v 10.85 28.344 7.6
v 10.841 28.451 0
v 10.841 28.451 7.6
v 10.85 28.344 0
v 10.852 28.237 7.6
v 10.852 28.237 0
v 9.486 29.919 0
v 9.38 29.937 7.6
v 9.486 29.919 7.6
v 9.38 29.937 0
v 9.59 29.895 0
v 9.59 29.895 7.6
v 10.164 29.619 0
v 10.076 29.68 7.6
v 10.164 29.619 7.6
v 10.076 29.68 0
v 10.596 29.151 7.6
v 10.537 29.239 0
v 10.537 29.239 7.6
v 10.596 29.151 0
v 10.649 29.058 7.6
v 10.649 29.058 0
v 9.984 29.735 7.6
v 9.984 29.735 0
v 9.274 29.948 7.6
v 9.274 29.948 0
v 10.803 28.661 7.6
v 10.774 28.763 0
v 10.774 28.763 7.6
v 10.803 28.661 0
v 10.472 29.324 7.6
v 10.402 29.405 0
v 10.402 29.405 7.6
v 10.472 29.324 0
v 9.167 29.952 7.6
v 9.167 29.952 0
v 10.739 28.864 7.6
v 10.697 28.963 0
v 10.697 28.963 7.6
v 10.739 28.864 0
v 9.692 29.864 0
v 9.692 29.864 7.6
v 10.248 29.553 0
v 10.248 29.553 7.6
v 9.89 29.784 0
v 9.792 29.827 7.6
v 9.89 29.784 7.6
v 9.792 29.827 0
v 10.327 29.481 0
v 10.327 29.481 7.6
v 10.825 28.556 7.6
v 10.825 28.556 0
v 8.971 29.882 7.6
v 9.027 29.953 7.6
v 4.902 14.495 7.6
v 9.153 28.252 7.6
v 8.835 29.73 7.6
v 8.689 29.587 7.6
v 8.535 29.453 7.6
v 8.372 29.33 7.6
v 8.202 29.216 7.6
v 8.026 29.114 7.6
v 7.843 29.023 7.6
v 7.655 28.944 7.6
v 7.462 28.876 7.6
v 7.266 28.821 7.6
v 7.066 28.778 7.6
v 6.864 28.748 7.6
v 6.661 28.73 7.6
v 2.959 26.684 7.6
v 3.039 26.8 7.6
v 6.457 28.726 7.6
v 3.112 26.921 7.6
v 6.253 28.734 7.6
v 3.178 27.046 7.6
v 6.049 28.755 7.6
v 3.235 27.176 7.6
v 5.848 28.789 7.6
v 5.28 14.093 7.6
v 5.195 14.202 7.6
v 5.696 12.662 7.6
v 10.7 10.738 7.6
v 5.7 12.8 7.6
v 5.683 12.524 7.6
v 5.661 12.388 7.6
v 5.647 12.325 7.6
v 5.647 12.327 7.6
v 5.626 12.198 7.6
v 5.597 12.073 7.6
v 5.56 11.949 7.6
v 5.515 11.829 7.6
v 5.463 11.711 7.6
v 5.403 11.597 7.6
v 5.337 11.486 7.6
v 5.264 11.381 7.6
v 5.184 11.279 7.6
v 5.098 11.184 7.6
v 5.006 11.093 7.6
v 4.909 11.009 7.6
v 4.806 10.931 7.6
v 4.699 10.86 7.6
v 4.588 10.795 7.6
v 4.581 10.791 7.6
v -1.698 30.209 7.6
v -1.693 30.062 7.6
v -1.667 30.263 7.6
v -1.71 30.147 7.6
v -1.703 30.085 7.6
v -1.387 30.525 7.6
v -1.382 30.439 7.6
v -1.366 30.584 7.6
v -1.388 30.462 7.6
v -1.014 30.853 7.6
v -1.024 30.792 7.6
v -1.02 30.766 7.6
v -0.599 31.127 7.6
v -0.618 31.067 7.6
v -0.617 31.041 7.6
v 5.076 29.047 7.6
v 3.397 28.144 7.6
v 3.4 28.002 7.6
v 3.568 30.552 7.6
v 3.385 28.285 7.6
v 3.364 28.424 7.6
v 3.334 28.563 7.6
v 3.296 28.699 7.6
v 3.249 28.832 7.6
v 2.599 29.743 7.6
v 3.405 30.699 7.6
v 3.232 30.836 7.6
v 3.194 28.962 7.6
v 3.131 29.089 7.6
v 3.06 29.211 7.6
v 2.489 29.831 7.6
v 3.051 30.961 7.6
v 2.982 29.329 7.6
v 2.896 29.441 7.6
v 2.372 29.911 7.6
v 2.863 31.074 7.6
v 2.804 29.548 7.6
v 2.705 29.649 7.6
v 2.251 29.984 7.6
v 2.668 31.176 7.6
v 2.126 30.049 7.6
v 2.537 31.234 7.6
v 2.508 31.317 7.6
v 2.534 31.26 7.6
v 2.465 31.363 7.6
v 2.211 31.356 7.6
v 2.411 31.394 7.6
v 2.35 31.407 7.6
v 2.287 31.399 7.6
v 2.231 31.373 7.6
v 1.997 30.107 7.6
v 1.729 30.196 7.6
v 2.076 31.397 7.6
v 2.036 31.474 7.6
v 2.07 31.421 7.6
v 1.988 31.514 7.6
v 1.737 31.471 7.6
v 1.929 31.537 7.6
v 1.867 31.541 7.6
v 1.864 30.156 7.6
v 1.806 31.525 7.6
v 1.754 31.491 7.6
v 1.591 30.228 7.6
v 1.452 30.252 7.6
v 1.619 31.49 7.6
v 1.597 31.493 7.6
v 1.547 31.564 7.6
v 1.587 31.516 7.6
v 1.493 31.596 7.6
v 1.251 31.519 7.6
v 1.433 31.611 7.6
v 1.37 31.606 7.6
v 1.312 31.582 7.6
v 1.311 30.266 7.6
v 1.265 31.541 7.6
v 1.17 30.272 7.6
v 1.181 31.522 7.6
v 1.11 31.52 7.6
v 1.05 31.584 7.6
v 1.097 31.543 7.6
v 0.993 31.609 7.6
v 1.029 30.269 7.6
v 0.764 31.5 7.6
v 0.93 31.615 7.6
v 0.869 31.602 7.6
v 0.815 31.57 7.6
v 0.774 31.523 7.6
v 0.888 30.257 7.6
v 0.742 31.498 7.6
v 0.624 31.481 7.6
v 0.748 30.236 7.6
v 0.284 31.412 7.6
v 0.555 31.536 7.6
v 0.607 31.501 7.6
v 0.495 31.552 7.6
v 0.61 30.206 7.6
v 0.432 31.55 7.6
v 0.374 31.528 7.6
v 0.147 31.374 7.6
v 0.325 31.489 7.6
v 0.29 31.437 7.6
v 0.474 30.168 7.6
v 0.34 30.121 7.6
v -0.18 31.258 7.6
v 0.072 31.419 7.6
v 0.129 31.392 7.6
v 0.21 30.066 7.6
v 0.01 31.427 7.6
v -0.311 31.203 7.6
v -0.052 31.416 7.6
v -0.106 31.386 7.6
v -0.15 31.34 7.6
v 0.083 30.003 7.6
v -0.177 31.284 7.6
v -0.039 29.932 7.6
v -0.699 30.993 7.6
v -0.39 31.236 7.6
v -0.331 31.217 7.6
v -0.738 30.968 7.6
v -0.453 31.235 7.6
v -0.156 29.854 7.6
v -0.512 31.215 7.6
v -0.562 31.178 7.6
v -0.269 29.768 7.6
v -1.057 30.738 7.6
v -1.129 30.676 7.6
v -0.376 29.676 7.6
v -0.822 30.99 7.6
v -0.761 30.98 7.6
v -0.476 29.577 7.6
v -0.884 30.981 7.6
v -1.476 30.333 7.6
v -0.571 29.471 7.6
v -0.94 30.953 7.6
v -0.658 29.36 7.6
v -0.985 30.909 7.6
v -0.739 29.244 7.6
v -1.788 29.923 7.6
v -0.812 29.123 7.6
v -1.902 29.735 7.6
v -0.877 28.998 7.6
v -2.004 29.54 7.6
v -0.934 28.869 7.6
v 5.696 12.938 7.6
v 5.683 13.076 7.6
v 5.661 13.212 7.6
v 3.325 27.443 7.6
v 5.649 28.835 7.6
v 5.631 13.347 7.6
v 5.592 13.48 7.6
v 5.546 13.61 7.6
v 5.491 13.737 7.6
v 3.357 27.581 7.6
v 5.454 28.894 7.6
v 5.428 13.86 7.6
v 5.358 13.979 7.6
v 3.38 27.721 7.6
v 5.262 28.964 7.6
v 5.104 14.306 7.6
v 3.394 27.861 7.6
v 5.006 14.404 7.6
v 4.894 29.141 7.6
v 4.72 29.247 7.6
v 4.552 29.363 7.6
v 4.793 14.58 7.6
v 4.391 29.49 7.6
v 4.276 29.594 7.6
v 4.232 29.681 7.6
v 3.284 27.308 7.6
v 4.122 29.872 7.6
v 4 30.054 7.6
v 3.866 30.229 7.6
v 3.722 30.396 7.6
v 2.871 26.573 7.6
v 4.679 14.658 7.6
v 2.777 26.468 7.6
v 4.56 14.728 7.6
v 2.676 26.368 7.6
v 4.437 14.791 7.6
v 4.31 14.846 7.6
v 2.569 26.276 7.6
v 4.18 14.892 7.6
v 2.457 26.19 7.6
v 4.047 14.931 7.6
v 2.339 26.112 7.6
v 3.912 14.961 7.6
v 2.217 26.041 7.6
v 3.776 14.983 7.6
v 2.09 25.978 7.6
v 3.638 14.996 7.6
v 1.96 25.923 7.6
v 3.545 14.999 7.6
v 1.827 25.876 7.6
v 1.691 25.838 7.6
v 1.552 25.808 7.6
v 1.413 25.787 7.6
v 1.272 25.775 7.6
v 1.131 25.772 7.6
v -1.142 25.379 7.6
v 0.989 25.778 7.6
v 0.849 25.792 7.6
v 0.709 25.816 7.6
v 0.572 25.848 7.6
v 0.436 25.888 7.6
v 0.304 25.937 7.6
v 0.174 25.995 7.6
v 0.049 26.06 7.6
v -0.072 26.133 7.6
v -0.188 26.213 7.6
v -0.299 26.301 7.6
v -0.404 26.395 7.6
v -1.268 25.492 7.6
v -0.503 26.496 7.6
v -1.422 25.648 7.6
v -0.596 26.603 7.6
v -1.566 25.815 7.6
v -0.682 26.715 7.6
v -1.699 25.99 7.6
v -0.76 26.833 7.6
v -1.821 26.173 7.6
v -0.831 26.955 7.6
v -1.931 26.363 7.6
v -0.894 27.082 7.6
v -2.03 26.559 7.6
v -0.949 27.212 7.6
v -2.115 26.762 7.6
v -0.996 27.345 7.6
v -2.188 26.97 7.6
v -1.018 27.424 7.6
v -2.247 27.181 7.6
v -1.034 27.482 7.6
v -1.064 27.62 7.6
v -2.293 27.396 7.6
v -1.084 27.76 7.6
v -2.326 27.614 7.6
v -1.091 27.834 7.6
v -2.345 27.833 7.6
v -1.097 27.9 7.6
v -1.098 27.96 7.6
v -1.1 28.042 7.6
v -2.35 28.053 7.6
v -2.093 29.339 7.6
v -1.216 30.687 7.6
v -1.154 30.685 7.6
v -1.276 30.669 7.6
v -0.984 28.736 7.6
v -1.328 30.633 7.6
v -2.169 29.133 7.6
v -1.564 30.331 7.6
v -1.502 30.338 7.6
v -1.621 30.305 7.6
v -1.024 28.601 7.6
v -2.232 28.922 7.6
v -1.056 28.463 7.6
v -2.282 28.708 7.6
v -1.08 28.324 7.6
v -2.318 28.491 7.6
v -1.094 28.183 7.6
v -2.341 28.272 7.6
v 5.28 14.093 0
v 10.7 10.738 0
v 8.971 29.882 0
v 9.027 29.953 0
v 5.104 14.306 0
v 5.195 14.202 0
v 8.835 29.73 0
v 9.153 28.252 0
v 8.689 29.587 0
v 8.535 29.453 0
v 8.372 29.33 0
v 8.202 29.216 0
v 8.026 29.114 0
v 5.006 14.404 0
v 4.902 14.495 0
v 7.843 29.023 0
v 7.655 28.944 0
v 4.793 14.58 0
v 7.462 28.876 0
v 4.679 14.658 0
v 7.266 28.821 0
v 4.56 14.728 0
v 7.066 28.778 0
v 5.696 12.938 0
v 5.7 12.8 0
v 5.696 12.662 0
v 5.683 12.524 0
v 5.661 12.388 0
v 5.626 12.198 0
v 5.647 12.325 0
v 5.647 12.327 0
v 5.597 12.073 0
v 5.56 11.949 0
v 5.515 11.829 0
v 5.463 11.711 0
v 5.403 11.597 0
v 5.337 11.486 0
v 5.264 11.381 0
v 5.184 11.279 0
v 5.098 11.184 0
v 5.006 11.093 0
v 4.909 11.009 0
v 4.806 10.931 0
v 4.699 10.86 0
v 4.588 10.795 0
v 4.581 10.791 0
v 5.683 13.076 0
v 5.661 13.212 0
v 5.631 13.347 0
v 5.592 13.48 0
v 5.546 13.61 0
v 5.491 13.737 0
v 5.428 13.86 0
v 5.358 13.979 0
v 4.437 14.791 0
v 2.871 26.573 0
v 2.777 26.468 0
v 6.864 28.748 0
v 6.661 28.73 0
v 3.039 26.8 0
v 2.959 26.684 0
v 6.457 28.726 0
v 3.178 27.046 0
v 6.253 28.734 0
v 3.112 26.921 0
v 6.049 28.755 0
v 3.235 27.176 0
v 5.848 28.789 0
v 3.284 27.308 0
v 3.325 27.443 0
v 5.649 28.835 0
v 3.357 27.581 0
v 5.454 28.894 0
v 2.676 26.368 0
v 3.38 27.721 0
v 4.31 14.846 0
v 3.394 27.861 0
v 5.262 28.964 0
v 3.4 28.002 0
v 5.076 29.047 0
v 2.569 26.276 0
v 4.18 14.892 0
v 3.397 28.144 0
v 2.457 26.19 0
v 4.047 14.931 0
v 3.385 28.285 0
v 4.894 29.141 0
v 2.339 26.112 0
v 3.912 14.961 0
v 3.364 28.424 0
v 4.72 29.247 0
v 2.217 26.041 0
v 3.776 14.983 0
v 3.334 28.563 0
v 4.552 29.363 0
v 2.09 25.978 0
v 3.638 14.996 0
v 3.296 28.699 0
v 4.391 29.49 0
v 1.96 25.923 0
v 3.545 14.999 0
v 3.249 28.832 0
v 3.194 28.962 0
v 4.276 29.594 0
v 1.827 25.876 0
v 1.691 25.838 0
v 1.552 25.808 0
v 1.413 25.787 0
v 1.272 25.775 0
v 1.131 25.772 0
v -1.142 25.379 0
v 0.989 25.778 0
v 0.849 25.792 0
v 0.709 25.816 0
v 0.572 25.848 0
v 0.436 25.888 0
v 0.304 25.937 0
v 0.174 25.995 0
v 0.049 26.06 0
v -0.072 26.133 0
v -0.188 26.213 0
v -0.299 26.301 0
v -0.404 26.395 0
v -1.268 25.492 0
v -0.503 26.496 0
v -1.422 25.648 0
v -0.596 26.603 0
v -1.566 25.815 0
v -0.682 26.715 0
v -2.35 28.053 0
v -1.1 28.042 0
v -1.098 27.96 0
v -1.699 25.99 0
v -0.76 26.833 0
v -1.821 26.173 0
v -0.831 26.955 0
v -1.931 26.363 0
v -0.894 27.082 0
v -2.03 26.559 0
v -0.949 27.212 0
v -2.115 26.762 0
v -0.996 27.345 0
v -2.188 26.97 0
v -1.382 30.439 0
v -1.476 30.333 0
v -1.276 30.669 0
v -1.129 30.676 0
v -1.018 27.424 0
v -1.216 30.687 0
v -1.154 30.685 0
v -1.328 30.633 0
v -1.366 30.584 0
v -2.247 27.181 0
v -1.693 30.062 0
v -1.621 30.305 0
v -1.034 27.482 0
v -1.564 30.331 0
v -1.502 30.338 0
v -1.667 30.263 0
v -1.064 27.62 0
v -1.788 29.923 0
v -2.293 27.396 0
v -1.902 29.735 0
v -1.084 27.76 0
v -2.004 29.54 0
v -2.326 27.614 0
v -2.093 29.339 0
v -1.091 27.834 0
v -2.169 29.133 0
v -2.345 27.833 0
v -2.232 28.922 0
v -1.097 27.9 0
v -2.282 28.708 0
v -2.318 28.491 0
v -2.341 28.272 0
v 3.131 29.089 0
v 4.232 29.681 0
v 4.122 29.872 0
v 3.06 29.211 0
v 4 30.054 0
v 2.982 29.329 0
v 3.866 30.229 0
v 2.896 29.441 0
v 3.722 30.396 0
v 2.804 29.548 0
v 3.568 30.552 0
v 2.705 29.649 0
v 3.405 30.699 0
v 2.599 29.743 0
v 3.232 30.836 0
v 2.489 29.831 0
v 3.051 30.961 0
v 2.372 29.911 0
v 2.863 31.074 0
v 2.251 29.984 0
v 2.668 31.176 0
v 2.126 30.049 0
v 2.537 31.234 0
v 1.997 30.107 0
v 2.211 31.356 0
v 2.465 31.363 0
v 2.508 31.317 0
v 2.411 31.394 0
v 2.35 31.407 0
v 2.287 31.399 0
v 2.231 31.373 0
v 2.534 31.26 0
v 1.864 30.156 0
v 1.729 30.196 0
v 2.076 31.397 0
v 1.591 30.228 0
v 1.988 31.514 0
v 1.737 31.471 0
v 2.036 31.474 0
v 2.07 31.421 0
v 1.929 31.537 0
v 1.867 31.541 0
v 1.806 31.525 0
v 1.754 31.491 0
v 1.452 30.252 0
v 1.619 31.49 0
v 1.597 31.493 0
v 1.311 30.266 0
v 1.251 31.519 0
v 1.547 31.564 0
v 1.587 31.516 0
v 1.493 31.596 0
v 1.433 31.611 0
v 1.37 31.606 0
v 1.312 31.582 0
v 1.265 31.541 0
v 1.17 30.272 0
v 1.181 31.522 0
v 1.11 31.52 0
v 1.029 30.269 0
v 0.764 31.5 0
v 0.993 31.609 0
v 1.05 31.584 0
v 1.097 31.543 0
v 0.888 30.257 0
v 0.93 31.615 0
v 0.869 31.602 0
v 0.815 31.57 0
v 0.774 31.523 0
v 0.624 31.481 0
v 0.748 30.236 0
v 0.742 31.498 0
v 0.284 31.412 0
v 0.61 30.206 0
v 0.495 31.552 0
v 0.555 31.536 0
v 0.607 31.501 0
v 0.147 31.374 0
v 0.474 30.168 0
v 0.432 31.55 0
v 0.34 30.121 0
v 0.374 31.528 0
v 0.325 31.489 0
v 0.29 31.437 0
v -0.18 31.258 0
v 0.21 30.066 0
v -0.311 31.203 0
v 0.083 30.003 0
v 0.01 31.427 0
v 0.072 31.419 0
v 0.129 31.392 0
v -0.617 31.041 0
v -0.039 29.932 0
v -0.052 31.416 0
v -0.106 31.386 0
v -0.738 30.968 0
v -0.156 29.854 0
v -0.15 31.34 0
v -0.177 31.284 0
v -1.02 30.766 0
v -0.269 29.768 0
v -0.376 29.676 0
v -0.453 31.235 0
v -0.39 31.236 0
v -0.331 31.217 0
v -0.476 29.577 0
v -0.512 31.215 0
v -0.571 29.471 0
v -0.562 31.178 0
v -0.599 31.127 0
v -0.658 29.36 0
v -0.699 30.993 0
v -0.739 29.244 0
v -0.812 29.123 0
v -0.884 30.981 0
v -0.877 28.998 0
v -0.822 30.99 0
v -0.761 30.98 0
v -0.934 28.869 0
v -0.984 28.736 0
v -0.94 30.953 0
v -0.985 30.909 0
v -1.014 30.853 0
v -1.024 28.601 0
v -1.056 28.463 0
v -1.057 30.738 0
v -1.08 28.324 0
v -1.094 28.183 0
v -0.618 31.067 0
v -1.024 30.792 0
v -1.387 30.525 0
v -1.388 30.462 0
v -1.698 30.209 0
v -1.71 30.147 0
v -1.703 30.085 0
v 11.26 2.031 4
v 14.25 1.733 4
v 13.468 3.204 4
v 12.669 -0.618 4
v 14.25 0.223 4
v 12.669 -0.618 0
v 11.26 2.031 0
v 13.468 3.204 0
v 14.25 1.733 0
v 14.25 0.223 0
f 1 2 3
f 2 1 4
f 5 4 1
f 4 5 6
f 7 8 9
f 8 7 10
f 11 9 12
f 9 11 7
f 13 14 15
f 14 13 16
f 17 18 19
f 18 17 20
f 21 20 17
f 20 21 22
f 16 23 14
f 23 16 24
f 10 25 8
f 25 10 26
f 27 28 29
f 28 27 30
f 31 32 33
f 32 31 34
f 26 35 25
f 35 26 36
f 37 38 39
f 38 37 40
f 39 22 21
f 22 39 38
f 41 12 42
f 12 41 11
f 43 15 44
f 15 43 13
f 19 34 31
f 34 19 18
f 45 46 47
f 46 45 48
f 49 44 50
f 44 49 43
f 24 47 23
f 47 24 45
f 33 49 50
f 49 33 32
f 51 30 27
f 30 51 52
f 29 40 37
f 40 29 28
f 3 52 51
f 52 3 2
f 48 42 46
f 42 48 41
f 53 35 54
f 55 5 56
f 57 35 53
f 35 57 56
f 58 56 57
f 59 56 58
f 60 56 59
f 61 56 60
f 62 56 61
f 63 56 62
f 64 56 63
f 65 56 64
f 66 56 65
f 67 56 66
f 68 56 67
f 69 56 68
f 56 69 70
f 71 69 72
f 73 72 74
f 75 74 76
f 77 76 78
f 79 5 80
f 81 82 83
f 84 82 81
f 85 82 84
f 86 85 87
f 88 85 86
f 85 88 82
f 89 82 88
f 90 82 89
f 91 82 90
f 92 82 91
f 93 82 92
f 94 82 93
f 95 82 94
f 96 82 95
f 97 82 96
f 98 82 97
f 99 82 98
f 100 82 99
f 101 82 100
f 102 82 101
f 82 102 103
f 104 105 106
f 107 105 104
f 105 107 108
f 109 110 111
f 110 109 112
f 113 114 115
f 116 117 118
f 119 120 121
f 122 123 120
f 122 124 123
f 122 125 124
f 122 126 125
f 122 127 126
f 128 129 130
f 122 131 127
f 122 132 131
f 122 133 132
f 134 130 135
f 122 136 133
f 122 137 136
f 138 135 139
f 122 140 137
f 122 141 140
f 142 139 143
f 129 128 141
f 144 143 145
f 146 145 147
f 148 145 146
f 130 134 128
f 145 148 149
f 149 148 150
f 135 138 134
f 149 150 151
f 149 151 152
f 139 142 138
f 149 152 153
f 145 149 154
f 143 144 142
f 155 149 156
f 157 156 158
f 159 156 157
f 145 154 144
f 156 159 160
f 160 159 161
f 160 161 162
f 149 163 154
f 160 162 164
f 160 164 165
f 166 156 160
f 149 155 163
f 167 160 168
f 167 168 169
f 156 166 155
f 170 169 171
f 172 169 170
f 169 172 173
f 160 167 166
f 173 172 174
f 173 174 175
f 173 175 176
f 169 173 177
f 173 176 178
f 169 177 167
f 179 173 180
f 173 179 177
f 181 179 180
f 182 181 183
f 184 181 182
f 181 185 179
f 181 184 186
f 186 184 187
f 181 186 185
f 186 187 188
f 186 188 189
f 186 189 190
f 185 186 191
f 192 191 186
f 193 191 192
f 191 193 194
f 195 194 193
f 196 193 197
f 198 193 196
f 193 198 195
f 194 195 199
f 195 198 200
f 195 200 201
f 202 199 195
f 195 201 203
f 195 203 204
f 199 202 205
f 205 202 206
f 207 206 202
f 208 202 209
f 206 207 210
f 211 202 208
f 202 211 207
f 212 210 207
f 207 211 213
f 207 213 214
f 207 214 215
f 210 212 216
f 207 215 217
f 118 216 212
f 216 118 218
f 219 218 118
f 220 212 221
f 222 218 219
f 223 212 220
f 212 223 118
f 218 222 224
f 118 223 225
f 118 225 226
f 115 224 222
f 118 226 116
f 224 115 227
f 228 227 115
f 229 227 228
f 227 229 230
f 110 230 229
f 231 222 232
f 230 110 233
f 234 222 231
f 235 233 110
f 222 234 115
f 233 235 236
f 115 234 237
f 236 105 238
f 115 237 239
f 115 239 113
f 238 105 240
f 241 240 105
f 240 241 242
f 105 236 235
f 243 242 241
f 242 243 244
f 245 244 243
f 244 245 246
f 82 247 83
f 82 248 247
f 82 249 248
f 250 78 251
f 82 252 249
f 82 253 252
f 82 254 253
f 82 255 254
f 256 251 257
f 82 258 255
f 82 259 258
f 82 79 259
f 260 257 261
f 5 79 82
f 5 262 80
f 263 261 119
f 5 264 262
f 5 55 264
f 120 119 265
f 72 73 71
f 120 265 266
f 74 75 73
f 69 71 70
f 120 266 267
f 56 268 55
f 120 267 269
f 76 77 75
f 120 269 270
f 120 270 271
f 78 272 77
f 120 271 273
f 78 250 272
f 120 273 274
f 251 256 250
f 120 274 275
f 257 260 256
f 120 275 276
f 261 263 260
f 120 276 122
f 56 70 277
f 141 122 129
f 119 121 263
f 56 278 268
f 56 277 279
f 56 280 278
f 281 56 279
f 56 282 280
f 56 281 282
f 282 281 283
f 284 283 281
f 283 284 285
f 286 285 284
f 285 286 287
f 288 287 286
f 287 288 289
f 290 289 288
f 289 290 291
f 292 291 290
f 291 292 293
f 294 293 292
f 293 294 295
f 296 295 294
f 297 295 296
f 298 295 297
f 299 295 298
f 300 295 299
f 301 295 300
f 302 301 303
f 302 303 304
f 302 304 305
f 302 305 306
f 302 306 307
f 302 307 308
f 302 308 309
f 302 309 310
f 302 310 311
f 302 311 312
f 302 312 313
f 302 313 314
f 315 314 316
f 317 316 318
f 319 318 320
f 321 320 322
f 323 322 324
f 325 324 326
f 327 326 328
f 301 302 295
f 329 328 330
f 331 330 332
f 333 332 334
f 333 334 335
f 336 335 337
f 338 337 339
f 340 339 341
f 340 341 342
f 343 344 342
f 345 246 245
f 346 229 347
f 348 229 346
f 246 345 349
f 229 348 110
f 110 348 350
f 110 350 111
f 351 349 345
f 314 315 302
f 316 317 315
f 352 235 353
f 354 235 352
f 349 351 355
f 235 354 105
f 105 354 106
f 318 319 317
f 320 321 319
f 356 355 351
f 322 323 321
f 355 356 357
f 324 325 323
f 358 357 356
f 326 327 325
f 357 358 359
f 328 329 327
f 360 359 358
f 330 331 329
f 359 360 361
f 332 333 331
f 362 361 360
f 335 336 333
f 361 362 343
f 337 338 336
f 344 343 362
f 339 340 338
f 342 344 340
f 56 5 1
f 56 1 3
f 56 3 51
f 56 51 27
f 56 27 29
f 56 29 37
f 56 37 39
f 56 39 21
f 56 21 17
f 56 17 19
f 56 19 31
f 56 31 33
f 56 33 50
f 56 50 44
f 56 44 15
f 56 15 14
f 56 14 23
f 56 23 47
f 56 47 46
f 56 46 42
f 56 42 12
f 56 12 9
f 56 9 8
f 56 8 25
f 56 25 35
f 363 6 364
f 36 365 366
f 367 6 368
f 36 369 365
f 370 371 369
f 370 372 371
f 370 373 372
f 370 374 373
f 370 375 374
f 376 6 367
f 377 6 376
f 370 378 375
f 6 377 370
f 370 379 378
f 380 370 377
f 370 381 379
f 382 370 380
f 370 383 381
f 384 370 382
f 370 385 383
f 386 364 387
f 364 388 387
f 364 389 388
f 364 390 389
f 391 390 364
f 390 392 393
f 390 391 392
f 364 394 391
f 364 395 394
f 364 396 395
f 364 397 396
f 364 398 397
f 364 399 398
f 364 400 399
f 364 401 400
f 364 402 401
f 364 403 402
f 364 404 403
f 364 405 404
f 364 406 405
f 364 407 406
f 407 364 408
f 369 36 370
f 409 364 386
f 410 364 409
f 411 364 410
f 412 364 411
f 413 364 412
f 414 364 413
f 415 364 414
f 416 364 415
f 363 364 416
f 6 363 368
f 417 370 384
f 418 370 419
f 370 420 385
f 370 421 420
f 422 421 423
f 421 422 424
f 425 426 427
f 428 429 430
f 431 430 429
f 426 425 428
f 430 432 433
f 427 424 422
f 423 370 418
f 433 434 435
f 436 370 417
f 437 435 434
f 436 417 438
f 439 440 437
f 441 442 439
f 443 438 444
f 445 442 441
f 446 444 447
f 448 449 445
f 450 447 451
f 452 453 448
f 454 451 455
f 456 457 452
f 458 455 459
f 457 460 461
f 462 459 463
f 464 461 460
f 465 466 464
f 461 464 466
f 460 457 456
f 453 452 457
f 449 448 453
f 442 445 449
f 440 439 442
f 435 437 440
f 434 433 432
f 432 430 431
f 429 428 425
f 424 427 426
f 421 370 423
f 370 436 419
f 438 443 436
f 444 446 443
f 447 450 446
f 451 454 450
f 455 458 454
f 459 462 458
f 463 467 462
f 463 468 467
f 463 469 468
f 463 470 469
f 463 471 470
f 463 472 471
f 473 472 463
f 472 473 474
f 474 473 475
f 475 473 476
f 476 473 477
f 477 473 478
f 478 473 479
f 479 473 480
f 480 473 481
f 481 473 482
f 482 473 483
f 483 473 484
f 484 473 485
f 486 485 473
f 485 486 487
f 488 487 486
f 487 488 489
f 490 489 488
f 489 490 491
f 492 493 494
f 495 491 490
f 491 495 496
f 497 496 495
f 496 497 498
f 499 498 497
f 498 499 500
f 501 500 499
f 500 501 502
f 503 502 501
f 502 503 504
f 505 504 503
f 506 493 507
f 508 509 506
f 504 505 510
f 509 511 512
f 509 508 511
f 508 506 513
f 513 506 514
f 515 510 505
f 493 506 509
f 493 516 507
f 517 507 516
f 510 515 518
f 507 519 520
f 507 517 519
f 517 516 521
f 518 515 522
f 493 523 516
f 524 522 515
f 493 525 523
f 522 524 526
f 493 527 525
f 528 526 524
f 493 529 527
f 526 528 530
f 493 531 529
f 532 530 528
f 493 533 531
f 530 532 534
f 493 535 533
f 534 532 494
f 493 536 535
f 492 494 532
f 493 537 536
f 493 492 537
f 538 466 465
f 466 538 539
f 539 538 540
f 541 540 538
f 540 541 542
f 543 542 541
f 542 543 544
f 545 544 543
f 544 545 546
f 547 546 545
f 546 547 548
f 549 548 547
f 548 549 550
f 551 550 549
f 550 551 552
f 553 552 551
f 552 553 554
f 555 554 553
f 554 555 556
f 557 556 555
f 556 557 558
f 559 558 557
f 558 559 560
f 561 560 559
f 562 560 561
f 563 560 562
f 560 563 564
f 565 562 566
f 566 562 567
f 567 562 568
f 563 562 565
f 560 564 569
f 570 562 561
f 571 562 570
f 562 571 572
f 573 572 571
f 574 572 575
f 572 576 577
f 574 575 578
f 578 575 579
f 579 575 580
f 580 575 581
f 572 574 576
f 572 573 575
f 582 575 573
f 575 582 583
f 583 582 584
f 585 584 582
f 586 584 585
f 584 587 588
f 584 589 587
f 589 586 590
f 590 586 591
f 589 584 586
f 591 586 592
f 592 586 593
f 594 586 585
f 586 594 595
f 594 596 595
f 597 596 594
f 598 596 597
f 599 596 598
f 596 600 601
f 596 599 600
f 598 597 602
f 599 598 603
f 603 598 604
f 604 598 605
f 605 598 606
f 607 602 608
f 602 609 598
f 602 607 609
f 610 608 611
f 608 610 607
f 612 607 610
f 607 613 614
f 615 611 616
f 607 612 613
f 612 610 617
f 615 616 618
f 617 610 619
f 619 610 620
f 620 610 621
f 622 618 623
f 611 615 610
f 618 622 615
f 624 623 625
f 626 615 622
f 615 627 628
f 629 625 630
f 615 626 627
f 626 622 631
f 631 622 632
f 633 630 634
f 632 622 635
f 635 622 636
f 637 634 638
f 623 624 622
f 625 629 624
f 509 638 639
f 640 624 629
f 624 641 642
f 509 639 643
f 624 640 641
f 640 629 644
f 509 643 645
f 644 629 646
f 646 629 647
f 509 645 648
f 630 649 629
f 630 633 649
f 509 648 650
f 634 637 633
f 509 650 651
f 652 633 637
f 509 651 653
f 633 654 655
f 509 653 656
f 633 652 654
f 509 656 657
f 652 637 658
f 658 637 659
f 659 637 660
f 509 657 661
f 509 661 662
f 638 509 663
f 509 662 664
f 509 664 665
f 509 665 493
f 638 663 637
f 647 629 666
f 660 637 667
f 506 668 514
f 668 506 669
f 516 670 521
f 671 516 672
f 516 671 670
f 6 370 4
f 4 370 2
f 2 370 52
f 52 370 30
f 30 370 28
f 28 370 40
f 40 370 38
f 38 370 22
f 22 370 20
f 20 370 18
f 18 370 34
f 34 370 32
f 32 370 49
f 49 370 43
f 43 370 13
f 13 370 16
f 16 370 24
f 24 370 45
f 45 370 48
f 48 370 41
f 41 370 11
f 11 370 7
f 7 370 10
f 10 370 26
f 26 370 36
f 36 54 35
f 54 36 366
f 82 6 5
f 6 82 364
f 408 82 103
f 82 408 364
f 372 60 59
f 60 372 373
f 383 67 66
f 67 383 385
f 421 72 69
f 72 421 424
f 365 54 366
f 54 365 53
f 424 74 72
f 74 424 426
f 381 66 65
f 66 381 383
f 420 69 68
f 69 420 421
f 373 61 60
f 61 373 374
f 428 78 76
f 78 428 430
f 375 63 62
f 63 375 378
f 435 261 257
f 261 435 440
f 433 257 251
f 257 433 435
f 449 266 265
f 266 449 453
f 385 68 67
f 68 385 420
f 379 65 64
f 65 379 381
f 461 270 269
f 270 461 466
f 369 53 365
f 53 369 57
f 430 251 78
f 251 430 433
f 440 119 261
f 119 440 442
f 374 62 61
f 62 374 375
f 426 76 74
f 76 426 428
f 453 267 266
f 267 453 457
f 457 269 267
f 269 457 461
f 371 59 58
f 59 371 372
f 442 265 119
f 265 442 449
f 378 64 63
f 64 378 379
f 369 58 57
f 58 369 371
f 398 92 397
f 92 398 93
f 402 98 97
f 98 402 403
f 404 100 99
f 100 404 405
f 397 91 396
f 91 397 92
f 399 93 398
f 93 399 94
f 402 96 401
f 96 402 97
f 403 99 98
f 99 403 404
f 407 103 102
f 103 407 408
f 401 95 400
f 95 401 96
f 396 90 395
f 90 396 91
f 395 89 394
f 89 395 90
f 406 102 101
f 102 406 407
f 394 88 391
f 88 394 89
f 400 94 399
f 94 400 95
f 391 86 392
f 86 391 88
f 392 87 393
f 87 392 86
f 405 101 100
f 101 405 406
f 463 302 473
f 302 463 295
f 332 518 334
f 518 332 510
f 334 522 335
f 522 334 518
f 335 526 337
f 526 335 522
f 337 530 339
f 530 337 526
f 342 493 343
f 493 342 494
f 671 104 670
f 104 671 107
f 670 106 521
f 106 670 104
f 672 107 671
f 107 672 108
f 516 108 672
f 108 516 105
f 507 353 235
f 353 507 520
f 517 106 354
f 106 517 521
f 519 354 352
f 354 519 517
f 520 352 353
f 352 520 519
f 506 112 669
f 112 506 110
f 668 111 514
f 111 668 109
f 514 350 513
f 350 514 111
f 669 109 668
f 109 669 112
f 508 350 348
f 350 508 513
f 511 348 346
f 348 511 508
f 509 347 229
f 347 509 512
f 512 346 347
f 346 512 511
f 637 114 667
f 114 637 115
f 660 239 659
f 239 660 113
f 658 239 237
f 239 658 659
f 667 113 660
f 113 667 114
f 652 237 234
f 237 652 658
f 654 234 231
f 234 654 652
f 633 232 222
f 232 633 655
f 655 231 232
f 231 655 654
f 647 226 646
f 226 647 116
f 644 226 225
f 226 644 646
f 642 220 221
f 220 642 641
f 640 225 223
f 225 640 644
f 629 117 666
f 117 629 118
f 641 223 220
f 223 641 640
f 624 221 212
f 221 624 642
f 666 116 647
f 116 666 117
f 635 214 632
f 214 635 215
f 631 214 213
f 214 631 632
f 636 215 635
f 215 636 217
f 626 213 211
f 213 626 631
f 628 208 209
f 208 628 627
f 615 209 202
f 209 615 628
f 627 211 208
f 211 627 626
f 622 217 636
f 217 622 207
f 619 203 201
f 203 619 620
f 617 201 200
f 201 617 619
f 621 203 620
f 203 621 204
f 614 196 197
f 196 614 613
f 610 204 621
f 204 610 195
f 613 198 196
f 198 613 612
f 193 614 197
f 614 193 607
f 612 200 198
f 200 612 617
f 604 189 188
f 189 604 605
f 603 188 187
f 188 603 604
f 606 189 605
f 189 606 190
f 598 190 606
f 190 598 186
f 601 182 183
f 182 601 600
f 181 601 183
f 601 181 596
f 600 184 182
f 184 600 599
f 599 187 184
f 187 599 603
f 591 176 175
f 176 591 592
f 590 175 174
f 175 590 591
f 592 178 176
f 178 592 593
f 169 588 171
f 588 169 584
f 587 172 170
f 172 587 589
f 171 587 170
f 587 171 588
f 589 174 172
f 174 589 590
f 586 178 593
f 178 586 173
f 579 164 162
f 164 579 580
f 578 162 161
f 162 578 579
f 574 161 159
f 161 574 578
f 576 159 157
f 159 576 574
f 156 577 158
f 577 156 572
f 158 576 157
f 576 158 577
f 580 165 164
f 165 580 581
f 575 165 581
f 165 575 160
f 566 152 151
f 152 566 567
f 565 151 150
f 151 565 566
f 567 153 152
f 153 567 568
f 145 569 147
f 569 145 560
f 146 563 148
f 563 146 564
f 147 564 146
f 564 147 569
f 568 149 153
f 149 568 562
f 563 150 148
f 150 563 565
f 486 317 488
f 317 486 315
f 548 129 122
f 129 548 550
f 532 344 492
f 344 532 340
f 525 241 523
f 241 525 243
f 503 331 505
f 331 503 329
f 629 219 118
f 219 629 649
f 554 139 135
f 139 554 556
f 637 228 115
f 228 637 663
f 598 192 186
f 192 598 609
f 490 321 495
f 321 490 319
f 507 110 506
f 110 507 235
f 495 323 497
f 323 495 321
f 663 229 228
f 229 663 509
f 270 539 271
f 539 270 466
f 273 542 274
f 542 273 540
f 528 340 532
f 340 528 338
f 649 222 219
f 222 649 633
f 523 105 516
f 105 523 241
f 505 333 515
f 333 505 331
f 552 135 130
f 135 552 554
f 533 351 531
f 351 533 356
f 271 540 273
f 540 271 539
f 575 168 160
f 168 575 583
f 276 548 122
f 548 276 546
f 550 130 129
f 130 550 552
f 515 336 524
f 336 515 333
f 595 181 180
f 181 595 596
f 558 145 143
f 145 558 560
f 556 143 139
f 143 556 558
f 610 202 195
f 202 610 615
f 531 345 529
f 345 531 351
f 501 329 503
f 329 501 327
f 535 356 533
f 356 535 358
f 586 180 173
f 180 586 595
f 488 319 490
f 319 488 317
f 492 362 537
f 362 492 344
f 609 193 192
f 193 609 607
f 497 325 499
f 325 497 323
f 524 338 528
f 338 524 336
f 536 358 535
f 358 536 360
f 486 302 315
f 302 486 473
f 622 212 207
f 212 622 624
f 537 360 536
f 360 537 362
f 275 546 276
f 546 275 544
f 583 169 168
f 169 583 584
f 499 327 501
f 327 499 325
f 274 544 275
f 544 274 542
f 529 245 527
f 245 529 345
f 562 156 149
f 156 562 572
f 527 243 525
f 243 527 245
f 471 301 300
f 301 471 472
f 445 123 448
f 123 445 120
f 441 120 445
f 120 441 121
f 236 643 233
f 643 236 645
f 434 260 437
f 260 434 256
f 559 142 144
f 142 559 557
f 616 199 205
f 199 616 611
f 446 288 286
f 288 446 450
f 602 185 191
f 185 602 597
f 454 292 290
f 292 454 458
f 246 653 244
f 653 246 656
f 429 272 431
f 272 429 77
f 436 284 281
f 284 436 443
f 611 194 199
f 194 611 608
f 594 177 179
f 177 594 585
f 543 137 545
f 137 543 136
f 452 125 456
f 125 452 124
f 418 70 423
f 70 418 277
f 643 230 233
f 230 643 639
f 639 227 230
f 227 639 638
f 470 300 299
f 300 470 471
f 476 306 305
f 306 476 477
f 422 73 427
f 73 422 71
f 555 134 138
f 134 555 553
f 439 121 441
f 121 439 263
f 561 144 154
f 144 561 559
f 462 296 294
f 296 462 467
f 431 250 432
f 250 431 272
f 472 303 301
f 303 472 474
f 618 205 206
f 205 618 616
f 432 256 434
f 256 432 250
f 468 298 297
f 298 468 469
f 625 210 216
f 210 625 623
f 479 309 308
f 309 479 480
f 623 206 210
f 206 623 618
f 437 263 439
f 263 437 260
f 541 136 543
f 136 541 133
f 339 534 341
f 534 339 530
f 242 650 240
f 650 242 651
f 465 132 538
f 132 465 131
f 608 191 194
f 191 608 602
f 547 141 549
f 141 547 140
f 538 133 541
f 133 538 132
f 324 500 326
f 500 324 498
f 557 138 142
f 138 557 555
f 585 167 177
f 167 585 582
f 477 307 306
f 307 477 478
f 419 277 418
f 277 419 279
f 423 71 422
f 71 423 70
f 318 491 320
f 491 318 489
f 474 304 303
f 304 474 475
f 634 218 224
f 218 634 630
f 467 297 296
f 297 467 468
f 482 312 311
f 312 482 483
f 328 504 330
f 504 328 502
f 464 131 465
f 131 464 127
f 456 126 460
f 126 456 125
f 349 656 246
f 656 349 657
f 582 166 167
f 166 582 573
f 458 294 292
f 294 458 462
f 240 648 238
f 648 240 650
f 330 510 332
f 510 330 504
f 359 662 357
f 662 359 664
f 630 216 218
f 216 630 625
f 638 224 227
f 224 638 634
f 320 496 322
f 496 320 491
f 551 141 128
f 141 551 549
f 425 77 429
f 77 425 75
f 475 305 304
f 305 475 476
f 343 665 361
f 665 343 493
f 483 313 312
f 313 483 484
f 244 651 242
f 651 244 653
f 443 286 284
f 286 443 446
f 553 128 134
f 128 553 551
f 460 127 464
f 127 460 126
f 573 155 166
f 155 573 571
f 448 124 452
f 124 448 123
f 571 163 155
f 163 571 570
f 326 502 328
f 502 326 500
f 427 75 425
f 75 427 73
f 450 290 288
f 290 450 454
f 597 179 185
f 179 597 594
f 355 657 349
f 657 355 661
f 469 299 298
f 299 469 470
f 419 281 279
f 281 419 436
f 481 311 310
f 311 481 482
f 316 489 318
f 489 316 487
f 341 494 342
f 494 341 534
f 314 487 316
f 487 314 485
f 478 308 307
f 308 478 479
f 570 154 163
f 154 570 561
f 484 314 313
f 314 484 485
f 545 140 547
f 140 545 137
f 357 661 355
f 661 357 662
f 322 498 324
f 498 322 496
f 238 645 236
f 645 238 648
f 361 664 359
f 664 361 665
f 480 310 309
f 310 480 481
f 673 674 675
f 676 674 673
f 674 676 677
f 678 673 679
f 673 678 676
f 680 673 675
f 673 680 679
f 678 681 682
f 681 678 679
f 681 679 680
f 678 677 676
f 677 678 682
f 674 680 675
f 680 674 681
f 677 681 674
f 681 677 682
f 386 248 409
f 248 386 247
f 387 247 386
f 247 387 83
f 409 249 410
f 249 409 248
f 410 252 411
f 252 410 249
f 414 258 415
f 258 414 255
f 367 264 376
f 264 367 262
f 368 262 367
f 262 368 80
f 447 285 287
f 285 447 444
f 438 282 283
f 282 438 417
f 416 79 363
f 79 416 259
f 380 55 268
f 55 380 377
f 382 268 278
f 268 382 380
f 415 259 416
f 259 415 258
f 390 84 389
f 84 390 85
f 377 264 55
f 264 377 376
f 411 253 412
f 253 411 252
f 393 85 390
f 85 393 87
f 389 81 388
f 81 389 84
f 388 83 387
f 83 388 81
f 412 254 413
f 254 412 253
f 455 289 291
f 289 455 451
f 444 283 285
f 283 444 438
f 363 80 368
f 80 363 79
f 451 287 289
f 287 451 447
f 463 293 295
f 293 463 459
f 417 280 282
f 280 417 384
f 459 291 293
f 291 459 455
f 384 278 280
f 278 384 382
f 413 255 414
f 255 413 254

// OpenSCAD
depth = 7.6;


$fn=100;


final();

module quarter(height, radius)
{
	difference()
	{
		cylinder(height, r=radius);

		translate([-radius, -radius])
			cube([2*radius, radius, height]);

		translate([-radius,0])
			cube([radius, radius, height]);
	}
}
module inquarter(height, radius)
{
	difference()
	{
		cube([radius, radius, height]);
		difference()
		{
			cylinder(height, r=radius);

			translate([-radius, -radius])
				cube([2*radius, radius, height]);

			translate([-radius,0])
				cube([radius, radius, height]);
		}
	}
}

module hammer()
{
	//height 19.2
	//width 7.1
	difference()
	{
		cube([7.1,19.2, depth]);

		translate([7.1-1.7, 19.2-1.7])
			inquarter(depth, 1.7);

		translate([2.7, 19.2+2])
			cylinder(depth,d=6.5);


		translate([0, 1.8])
		cylinder(depth,d=4.1);
	}
	difference()
	{
		linear_extrude(depth)
			polygon([
		[0,4],
		[-13.2+7.1,19.2-2],
		[0,19.2-2],
			]);
		
		translate([-9.7+7.1,19.2-2])
			cylinder(depth,d=4.5);
	}

	translate([-9.7+7.1,19.2-2])
	difference()
	{
		union()
		{
			cylinder(depth,d=7);
			for (i = [1:10])
			{
				rotate(150-8*i,[0,0,1])
				translate([7/2-0.1,0,0])
				cylinder(depth,d=0.4, $fn=20);
			}
		}
		cylinder(depth,d=4.5);
	}
}

module hammercon()
{
	difference()
	{
		scalefactor=1/12.3;
		linear_extrude(depth)
			scale(scalefactor)
				import("profiles/hammercon.dxf");
		// spring place
		// 5.3 + 2
		// height 4

		translate([10.8,5,4])
		difference()
		{
			cylinder(depth-4+1,d=5.3+2*1.6);
			cylinder(depth-4+1,d=5.3);
		}
		translate([10,-4,4])
			rotate(20,[0,0,1])
				cube([10,5,depth-4+1]);
	}
}

module final()
{
	
	difference()
	{
		union()
		{
			translate([3.6,10.8,0])
			rotate(-0.5,[0,0,1])
			hammer();

			hammercon();

			difference()
			{
				translate([12.34,0,0])
				rotate(28,[0,0,1])
				translate([0,-0.7,0])
					cube([2.5,3,4]);
				
				translate([14.25,0,0])
					cube([2,3,4]);
			}
		}
		
		translate([3.5,11,0])
			translate([0, 1.8])
				cylinder(depth,d=4.4);
	}

}
